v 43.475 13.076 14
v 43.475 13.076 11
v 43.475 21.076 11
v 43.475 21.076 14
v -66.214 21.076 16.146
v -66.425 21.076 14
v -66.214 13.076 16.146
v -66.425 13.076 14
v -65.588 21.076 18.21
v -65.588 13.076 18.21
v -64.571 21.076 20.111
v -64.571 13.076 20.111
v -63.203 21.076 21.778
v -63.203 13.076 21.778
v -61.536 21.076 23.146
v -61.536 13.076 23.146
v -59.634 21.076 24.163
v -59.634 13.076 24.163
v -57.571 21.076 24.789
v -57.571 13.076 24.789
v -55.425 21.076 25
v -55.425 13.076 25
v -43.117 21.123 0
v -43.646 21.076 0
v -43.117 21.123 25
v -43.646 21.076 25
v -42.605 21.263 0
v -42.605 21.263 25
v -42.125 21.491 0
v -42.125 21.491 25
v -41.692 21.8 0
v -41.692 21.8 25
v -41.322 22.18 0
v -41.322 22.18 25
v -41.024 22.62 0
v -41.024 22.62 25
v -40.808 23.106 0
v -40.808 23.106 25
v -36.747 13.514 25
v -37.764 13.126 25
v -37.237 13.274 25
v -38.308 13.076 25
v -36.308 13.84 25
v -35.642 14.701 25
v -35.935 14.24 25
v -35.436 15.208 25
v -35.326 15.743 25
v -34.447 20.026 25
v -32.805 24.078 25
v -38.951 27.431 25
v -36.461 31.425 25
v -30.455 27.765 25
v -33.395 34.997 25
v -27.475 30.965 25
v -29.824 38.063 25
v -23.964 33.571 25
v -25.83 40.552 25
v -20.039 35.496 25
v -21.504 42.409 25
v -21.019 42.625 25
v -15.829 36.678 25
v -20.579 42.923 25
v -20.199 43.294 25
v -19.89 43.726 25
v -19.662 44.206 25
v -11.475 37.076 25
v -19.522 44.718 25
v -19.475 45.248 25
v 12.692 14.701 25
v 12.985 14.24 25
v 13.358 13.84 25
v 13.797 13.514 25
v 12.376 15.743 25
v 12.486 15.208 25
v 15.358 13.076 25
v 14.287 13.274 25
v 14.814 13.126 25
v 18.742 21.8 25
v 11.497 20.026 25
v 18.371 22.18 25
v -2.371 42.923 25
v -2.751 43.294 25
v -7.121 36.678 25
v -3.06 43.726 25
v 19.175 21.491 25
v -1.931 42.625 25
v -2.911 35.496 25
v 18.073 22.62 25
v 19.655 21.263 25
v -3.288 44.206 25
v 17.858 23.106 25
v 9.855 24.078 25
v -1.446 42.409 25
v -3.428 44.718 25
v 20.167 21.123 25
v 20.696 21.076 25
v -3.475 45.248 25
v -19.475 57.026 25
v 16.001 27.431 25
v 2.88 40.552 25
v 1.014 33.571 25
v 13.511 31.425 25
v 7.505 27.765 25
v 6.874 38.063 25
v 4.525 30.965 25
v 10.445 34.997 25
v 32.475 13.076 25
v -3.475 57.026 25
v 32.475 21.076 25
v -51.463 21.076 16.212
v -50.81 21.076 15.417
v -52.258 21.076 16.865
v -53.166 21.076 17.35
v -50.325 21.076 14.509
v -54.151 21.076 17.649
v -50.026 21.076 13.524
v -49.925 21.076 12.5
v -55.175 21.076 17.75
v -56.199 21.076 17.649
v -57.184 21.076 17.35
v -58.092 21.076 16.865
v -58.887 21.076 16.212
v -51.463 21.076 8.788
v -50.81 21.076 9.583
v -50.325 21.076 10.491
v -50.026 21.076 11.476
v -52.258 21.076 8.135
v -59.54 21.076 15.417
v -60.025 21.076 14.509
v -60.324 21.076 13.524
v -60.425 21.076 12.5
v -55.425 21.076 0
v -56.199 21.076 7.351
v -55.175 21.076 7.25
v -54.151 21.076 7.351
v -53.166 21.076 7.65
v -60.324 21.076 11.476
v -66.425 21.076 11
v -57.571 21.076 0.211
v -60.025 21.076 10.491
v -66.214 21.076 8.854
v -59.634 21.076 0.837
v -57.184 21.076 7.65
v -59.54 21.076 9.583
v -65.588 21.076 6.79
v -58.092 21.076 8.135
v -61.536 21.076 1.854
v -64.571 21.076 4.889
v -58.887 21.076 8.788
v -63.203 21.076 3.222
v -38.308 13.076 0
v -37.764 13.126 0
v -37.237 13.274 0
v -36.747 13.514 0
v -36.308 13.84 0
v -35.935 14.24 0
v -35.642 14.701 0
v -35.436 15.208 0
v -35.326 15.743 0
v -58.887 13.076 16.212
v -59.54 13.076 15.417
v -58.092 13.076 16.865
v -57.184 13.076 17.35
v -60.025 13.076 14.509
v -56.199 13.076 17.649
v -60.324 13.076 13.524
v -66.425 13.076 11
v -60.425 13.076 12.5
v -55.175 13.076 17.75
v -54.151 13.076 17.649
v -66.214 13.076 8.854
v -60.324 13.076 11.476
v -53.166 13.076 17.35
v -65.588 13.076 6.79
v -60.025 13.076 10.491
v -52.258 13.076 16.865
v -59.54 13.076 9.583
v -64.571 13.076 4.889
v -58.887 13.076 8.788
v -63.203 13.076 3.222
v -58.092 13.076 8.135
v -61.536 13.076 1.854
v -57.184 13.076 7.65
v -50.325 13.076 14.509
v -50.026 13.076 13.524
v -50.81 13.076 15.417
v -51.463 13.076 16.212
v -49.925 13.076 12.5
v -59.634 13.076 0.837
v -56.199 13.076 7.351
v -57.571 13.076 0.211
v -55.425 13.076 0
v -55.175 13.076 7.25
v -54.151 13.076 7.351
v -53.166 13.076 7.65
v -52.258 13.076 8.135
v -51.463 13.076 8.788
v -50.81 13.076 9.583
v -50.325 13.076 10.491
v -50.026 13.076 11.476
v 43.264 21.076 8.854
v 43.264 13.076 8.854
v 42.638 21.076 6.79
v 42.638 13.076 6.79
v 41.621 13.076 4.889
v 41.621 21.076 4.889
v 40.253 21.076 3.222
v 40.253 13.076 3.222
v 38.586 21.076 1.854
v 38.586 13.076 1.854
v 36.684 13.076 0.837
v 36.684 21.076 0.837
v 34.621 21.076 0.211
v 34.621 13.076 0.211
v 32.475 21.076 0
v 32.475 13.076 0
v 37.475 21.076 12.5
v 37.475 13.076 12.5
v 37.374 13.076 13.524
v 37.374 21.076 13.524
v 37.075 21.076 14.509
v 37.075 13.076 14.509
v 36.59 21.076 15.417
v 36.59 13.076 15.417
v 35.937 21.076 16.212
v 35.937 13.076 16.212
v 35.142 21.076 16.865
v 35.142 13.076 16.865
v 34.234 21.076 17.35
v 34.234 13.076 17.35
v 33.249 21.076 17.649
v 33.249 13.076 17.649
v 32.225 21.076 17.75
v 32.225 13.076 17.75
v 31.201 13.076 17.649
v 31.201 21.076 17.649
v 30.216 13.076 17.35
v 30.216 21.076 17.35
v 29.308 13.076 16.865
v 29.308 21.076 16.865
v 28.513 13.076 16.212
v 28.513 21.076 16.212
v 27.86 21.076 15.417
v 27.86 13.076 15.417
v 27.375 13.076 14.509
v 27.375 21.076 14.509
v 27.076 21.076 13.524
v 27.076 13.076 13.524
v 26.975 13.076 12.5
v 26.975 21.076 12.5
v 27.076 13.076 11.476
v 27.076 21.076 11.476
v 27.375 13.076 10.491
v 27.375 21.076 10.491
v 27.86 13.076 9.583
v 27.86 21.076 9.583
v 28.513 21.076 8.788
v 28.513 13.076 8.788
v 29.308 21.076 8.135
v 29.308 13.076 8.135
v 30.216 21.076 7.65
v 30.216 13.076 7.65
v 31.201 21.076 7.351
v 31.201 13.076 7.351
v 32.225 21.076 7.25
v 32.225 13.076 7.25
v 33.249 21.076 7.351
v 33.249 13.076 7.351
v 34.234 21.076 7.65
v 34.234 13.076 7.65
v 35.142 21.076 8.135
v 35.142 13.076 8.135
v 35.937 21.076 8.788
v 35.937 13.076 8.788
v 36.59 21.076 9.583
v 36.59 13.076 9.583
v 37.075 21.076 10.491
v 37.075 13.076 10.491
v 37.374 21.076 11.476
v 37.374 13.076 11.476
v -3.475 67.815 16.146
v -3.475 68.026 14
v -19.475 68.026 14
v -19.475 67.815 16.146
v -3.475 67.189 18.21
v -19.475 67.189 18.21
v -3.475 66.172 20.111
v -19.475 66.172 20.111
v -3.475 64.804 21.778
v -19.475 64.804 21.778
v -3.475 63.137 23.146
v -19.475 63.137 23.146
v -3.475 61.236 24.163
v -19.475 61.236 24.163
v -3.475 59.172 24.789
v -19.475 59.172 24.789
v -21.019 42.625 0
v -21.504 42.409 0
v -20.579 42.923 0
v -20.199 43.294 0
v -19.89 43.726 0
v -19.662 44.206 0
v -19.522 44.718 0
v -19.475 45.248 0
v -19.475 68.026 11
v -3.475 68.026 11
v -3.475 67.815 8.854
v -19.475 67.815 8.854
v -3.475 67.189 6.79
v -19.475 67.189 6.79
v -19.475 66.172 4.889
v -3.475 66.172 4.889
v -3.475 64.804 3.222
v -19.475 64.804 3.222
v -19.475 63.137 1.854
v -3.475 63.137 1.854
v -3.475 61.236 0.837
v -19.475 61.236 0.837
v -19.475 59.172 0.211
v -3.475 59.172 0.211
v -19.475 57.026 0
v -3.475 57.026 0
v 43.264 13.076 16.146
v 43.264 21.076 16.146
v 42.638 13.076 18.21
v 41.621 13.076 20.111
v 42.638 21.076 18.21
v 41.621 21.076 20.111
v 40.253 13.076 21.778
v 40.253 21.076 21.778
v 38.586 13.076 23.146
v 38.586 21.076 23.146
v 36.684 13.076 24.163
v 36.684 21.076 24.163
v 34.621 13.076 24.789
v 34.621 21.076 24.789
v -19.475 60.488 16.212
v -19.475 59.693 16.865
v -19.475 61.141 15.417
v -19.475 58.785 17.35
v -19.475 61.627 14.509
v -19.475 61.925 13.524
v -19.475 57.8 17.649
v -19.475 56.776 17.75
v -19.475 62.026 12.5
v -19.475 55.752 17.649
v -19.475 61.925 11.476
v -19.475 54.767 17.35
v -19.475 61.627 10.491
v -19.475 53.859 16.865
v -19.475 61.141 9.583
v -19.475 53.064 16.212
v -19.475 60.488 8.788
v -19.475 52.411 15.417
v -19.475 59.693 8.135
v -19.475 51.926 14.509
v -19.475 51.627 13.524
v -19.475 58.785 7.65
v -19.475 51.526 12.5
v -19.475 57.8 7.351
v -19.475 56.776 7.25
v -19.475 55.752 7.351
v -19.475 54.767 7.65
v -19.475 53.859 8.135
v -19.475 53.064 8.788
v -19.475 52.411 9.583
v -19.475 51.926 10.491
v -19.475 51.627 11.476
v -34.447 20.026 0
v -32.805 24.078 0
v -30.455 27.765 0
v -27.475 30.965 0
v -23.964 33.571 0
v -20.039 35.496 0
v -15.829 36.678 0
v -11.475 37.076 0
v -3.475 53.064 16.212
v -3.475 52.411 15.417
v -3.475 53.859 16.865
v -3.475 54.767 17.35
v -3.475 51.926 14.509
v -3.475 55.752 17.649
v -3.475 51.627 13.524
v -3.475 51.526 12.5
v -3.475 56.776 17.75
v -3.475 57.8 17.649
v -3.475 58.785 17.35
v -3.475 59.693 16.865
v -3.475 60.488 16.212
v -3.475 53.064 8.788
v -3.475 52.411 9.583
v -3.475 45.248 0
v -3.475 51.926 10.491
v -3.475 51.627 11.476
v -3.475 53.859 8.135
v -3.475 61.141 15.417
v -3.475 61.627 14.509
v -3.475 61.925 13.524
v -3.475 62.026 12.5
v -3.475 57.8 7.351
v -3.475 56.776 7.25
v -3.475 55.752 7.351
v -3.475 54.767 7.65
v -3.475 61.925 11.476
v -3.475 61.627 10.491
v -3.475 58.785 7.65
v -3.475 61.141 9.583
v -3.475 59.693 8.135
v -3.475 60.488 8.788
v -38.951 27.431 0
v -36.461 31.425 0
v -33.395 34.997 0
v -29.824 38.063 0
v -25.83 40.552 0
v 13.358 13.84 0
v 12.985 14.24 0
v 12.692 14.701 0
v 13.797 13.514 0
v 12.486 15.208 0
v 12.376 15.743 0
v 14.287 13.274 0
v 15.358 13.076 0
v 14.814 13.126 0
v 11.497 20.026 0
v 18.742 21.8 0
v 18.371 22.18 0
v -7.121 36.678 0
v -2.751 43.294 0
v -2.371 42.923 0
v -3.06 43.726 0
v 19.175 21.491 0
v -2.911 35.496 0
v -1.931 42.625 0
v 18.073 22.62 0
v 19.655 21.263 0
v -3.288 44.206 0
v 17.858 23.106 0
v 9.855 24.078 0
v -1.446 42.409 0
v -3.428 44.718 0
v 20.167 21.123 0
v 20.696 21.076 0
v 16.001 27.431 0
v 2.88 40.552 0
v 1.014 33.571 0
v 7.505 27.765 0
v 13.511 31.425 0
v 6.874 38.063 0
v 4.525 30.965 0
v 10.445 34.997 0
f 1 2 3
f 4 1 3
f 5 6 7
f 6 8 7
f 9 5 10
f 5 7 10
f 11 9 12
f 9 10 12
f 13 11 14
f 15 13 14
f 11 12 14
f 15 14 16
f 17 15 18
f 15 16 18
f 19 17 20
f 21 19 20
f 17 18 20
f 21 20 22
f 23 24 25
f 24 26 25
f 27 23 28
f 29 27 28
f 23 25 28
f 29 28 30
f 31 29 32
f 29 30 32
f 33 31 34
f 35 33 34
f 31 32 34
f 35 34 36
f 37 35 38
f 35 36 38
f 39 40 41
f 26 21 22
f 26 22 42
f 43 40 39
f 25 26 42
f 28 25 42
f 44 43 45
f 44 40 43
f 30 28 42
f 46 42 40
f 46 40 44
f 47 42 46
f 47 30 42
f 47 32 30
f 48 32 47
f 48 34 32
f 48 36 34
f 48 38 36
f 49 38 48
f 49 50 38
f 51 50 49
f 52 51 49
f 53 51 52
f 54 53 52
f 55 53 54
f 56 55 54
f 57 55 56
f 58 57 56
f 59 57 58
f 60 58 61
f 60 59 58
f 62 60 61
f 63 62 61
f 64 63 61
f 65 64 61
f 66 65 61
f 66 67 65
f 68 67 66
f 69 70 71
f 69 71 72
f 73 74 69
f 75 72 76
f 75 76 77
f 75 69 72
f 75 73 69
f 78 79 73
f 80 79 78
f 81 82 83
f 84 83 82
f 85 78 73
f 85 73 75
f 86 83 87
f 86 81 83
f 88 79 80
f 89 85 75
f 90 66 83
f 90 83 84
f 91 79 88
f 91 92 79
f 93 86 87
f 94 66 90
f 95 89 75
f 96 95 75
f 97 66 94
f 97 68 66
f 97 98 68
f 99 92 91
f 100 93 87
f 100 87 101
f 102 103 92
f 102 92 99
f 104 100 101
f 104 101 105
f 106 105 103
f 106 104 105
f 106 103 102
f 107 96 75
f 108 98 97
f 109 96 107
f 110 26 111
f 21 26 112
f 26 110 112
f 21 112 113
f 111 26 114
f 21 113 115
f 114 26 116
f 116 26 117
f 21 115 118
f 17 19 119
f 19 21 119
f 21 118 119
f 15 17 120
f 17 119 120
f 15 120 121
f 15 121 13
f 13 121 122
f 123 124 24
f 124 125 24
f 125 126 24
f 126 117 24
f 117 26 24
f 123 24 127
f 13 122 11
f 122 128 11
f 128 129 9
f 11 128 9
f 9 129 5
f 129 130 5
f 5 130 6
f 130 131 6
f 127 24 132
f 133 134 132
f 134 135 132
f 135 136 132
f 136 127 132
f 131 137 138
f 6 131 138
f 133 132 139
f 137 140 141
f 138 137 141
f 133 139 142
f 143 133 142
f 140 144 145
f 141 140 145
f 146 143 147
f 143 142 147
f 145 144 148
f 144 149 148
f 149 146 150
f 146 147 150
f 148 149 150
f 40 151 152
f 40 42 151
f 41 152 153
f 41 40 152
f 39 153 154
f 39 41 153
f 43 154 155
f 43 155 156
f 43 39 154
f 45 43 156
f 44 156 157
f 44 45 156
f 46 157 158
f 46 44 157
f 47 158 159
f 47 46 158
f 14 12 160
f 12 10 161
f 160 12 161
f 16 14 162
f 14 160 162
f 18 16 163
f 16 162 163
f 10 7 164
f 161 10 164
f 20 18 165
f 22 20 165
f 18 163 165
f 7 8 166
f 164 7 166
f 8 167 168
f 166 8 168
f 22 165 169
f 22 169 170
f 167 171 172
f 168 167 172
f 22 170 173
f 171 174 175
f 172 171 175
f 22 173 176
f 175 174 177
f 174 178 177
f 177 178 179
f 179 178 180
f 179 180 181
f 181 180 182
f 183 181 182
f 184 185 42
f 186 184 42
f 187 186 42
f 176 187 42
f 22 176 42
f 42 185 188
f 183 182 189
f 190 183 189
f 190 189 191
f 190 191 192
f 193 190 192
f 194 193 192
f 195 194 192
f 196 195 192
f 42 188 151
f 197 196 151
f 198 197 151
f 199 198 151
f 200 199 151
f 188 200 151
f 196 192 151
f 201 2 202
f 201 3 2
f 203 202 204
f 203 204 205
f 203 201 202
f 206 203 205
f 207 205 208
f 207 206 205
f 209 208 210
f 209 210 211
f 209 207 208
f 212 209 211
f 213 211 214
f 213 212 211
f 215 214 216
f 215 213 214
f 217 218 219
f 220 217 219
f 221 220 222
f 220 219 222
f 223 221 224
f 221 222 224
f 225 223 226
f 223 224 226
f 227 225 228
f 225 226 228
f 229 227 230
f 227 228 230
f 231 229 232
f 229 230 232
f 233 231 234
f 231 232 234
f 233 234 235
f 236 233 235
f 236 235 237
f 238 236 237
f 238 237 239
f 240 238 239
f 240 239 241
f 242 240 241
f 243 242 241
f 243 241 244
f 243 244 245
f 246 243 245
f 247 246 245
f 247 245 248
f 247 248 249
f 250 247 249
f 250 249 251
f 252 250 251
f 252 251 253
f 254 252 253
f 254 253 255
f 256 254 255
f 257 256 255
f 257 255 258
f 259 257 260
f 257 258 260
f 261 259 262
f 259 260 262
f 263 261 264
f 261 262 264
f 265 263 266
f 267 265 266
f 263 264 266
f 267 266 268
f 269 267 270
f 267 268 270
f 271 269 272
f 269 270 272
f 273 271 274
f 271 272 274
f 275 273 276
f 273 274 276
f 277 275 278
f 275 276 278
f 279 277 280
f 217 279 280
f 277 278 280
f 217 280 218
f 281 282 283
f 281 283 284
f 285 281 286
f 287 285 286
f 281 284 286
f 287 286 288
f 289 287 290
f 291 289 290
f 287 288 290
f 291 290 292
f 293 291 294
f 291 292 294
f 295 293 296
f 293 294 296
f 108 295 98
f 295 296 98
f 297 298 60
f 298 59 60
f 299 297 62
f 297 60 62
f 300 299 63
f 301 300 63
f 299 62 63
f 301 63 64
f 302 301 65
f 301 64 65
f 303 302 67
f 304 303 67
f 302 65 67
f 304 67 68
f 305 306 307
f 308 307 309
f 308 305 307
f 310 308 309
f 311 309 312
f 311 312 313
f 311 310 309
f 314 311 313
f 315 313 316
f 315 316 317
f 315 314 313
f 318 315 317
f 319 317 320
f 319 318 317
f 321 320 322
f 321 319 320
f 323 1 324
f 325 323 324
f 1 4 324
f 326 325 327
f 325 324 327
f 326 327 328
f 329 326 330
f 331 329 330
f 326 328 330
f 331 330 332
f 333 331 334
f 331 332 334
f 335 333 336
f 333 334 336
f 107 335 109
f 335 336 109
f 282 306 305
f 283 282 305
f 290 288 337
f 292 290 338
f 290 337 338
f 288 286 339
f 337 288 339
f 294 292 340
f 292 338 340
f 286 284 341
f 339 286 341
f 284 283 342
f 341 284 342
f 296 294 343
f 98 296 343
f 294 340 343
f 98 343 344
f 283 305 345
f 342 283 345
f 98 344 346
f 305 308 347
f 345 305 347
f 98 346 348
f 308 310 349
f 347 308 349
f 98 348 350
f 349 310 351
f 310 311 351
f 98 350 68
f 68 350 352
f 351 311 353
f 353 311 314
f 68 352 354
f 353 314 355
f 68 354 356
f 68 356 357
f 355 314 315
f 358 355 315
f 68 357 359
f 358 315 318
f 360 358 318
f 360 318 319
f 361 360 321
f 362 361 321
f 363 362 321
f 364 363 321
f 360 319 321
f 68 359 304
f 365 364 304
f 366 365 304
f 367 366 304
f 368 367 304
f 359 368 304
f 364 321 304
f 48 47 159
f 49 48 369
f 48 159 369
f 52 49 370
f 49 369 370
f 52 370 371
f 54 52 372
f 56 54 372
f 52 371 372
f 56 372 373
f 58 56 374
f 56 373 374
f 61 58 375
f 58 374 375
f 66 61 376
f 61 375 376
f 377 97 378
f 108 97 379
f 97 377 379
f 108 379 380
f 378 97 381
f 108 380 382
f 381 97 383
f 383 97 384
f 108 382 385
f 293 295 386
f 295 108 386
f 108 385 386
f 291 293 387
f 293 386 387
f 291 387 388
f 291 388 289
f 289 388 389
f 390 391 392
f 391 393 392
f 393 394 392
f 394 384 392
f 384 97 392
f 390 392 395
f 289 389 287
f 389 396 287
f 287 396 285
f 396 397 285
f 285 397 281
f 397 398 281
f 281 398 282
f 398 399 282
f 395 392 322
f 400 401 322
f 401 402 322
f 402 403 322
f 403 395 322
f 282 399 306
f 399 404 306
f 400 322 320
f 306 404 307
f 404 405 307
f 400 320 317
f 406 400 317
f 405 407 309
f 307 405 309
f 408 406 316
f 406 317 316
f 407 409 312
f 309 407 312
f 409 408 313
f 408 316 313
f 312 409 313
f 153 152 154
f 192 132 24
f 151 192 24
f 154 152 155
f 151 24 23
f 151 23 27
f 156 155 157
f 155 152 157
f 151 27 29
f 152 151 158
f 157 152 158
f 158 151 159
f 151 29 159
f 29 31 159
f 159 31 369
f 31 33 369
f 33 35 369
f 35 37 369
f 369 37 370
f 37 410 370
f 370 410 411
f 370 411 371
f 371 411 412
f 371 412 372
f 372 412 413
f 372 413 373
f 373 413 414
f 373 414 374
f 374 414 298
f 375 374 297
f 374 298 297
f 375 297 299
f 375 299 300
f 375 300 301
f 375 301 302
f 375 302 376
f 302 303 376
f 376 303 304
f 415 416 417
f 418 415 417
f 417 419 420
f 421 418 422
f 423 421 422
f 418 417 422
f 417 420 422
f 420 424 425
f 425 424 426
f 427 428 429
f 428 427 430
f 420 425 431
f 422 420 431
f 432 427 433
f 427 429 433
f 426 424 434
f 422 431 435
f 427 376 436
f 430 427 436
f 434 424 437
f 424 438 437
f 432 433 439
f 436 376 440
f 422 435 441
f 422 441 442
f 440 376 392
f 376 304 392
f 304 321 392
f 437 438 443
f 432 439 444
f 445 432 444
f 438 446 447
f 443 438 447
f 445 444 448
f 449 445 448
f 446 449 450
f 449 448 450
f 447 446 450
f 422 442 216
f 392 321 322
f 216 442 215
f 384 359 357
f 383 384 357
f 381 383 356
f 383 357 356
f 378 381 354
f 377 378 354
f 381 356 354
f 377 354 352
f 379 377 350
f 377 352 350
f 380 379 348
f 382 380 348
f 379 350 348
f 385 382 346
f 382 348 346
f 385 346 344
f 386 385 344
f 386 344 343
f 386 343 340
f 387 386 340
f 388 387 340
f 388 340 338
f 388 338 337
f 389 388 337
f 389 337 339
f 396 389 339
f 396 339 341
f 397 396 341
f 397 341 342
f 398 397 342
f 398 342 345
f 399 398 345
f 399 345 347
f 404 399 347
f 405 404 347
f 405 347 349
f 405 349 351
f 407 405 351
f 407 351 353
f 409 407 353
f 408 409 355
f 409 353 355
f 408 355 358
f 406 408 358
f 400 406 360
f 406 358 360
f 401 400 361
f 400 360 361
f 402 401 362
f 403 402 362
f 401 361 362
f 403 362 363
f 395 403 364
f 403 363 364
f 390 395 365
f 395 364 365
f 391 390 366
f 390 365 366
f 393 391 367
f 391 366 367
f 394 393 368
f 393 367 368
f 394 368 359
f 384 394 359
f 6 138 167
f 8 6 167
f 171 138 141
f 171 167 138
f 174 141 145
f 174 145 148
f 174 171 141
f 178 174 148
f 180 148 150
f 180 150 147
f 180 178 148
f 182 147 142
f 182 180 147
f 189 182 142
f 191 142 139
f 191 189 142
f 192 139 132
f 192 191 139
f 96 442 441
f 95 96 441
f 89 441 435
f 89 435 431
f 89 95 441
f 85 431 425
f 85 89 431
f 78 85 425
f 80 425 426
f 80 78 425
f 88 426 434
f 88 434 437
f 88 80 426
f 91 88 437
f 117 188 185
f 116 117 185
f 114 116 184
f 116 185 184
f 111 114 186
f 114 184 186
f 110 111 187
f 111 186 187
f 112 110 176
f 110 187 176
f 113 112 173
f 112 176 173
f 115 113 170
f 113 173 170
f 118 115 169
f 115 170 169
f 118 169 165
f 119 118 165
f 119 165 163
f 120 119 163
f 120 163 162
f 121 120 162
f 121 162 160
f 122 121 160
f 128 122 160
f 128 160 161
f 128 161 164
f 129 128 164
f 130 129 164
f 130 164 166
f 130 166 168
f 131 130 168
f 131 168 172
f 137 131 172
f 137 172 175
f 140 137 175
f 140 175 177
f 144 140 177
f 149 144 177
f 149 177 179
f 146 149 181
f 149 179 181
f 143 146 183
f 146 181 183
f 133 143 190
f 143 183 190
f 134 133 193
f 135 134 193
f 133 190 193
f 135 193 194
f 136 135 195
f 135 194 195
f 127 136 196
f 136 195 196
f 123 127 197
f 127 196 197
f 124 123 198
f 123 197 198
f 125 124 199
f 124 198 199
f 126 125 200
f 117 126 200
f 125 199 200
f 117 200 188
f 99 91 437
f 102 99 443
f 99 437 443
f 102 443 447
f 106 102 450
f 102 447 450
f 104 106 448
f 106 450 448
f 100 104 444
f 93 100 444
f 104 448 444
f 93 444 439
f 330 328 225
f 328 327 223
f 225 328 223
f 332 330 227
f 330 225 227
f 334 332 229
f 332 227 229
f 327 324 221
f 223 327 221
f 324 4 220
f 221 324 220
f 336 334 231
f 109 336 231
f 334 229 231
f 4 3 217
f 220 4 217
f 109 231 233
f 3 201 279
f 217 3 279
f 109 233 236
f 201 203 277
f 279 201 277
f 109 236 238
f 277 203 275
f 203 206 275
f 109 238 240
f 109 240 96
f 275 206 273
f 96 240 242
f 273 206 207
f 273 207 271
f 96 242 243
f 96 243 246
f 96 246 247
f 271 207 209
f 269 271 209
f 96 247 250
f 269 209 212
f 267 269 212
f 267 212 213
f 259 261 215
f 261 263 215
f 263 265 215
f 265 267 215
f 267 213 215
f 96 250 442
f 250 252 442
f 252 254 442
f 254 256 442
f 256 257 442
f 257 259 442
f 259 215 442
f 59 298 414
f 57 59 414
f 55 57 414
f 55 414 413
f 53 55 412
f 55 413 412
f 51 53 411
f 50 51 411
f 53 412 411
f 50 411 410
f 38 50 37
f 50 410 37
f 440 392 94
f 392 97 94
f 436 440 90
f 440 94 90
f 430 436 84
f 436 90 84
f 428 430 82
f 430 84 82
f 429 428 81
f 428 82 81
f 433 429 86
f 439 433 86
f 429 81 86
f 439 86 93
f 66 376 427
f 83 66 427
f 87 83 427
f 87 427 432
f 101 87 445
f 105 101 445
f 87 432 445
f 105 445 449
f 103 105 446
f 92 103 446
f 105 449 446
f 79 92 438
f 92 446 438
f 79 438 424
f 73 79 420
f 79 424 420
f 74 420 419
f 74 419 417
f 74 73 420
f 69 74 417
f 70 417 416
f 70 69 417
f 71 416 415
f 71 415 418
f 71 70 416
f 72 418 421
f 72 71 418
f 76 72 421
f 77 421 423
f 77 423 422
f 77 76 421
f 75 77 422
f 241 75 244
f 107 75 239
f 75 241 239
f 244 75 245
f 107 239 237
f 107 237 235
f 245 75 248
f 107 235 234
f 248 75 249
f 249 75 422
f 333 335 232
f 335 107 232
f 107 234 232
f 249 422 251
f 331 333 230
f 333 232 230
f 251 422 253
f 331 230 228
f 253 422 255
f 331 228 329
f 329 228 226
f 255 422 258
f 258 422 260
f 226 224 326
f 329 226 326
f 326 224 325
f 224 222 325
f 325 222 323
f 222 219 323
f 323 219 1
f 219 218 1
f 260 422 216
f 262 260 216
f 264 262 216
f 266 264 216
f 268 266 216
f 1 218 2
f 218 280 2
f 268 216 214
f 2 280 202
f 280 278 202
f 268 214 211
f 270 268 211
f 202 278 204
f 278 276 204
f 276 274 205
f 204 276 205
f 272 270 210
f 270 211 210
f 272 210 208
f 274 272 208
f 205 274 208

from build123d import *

# Parameters (mm, degrees)
F1_DEPTH = 25
F2_R     = 11
F3_R     = 3
F4_R     = 3
F6_D     = 10.5
F8_D     = 10.5


with BuildPart() as f1:
    # F0 (on Top) → F1 (new body)
    with BuildSketch(Plane.XY):
        with BuildLine():
            ThreePointArc((-42.475013, 13.076226), (-42.211382, 17.110535), (-41.424972, 21.076226))
            Line((-41.424972, 21.076226), (-66.424972, 21.076226))
            Line((-66.424972, 21.076226), (-66.424972, 13.076226))
            Line((-66.424972, 13.076226), (-42.475013, 13.076226))
        make_face()
        with BuildLine():
            Line((43.474945, 21.076226), (18.474945, 21.076226))
            ThreePointArc((18.474945, 21.076226), (19.261355, 17.110535), (19.524987, 13.076226))
            Line((19.524987, 13.076226), (43.474945, 13.076226))
            Line((43.474945, 13.076226), (43.474945, 21.076226))
        make_face()
        with BuildLine():
            ThreePointArc((-3.475013, 43.026184), (-7.440705, 43.812595), (-11.475013, 44.076226))
            ThreePointArc((-11.475013, 44.076226), (-15.509322, 43.812595), (-19.475013, 43.026184))
            ThreePointArc((-19.475013, 43.026184), (-33.395323, 34.996536), (-41.424972, 21.076226))
            ThreePointArc((-41.424972, 21.076226), (-42.211382, 17.110535), (-42.475013, 13.076226))
            Line((-42.475013, 13.076226), (-35.475013, 13.076226))
            ThreePointArc((-35.475013, 13.076226), (-28.445576, 30.046789), (-11.475013, 37.076226))
            ThreePointArc((-11.475013, 37.076226), (5.495549, 30.046789), (12.524987, 13.076226))
            Line((12.524987, 13.076226), (19.524987, 13.076226))
            ThreePointArc((19.524987, 13.076226), (19.261355, 17.110535), (18.474945, 21.076226))
            ThreePointArc((18.474945, 21.076226), (10.445297, 34.996536), (-3.475013, 43.026184))
        make_face()
        with BuildLine():
            ThreePointArc((-19.475013, 43.026184), (-15.509322, 43.812595), (-11.475013, 44.076226))
            ThreePointArc((-11.475013, 44.076226), (-7.440705, 43.812595), (-3.475013, 43.026184))
            Line((-3.475013, 43.026184), (-3.475013, 68.026184))
            Line((-3.475013, 68.026184), (-19.475013, 68.026184))
            Line((-19.475013, 68.026184), (-19.475013, 43.026184))
        make_face()
    extrude(amount=F1_DEPTH)

    # F2
    f2_edges = [f1.edges().sort_by_distance(p)[0] for p in [
        (43.474945, 17.076226, 0),
        (43.474945, 17.076226, 25),
        (-66.424972, 17.076226, 25),
        (-66.424972, 17.076226, 0),
        (-11.475013, 68.026184, 0),
        (-11.475013, 68.026184, 25),
    ]]
    fillet(f2_edges, radius=F2_R)

    # F3
    f3_edges = [f1.edges().sort_by_distance(p)[0] for p in [
        (-35.475013, 13.076226, 12.5),
        (12.524987, 13.076226, 12.5),
    ]]
    fillet(f3_edges, radius=F3_R)

    # F4
    f4_edges = [f1.edges().sort_by_distance(p)[0] for p in [
        (-41.424972, 21.076226, 12.5),
        (18.474945, 21.076226, 12.5),
        (-3.475013, 43.026184, 12.5),
        (-19.475013, 43.026184, 12.5),
    ]]
    fillet(f4_edges, radius=F4_R)

    # F6 (through all)
    with Locations(Plane(origin=(0, 21.076226, 0), x_dir=(-1, 0, 0), z_dir=(0, 1, 0))):
        with Locations((55.174972, 12.5), (-32.224945, 12.5)):
            Hole(F6_D / 2)

    # F8 (through all)
    with Locations(Plane.YZ.offset(-3.475013)):
        with Locations((56.776184, 12.5)):
            Hole(F8_D / 2)


solid = f1.part
